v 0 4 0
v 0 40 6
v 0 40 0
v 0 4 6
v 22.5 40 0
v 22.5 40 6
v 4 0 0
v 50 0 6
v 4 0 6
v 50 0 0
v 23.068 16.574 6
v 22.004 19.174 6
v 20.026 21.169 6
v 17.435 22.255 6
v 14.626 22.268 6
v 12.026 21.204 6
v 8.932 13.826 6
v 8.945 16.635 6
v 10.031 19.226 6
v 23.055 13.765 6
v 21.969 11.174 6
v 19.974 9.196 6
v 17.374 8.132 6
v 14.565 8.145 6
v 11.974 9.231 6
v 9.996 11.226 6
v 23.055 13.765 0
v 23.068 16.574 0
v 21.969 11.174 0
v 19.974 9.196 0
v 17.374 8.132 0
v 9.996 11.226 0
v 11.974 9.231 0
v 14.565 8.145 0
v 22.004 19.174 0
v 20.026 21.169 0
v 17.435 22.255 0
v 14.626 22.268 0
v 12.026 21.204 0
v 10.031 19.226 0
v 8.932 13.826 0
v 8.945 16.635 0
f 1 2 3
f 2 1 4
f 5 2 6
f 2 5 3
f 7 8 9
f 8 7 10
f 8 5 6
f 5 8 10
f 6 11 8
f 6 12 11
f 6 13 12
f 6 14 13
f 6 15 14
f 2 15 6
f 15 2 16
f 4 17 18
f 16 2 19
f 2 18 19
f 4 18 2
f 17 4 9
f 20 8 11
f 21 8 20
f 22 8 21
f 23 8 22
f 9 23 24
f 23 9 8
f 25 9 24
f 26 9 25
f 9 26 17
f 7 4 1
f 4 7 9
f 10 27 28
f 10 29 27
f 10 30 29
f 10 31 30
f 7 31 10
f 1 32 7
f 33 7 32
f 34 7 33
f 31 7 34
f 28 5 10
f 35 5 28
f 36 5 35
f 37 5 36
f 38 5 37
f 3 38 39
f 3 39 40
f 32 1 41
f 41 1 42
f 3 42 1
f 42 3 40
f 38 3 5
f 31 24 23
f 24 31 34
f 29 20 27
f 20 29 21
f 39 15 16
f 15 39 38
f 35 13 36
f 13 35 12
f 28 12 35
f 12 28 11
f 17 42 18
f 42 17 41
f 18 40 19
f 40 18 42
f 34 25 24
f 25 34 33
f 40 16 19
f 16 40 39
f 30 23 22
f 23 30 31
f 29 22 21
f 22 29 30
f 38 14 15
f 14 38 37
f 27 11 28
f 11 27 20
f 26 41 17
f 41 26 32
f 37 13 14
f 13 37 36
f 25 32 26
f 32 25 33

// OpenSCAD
$fn = 32;

// ----------------------------------------------------------------------
// Bracket plate: gusset 50 x 40
// ----------------------------------------------------------------------

// --- parameters (mm) ---
hole_r = 3.5;             // bolt hole radius
plate_t = 6;              // plate thickness, Z (extrusion height)
gus_a = 50;               // base length
gus_b = 40;               // height
top_x = 22.5;             // top edge X of the angled cut
light_r = 7.2;            // lightening hole radius

light_d = 2 * light_r;

profile = [[4, 0], [25, 0], [50, 0], [22.5, 40], [0, 40], [0, 4]];  // primary outline, 6 points, counter clockwise
void_1 = [[23.068, 16.574], [22.004, 19.174], [20.026, 21.169], [17.435, 22.255], [14.626, 22.268], [12.026, 21.204], [10.031, 19.226], [8.945, 16.635], [8.932, 13.826], [9.996, 11.226], [11.974, 9.231], [14.565, 8.145], [17.374, 8.132], [19.974, 9.196], [21.969, 11.174], [23.055, 13.765]];  // lightening hole, 16 points

// --- the one profile operation ---
difference() {
  linear_extrude(height = plate_t) polygon(points = profile);
  translate([0, 0, -1])
    linear_extrude(height = plate_t + 2) polygon(points = void_1);
}
